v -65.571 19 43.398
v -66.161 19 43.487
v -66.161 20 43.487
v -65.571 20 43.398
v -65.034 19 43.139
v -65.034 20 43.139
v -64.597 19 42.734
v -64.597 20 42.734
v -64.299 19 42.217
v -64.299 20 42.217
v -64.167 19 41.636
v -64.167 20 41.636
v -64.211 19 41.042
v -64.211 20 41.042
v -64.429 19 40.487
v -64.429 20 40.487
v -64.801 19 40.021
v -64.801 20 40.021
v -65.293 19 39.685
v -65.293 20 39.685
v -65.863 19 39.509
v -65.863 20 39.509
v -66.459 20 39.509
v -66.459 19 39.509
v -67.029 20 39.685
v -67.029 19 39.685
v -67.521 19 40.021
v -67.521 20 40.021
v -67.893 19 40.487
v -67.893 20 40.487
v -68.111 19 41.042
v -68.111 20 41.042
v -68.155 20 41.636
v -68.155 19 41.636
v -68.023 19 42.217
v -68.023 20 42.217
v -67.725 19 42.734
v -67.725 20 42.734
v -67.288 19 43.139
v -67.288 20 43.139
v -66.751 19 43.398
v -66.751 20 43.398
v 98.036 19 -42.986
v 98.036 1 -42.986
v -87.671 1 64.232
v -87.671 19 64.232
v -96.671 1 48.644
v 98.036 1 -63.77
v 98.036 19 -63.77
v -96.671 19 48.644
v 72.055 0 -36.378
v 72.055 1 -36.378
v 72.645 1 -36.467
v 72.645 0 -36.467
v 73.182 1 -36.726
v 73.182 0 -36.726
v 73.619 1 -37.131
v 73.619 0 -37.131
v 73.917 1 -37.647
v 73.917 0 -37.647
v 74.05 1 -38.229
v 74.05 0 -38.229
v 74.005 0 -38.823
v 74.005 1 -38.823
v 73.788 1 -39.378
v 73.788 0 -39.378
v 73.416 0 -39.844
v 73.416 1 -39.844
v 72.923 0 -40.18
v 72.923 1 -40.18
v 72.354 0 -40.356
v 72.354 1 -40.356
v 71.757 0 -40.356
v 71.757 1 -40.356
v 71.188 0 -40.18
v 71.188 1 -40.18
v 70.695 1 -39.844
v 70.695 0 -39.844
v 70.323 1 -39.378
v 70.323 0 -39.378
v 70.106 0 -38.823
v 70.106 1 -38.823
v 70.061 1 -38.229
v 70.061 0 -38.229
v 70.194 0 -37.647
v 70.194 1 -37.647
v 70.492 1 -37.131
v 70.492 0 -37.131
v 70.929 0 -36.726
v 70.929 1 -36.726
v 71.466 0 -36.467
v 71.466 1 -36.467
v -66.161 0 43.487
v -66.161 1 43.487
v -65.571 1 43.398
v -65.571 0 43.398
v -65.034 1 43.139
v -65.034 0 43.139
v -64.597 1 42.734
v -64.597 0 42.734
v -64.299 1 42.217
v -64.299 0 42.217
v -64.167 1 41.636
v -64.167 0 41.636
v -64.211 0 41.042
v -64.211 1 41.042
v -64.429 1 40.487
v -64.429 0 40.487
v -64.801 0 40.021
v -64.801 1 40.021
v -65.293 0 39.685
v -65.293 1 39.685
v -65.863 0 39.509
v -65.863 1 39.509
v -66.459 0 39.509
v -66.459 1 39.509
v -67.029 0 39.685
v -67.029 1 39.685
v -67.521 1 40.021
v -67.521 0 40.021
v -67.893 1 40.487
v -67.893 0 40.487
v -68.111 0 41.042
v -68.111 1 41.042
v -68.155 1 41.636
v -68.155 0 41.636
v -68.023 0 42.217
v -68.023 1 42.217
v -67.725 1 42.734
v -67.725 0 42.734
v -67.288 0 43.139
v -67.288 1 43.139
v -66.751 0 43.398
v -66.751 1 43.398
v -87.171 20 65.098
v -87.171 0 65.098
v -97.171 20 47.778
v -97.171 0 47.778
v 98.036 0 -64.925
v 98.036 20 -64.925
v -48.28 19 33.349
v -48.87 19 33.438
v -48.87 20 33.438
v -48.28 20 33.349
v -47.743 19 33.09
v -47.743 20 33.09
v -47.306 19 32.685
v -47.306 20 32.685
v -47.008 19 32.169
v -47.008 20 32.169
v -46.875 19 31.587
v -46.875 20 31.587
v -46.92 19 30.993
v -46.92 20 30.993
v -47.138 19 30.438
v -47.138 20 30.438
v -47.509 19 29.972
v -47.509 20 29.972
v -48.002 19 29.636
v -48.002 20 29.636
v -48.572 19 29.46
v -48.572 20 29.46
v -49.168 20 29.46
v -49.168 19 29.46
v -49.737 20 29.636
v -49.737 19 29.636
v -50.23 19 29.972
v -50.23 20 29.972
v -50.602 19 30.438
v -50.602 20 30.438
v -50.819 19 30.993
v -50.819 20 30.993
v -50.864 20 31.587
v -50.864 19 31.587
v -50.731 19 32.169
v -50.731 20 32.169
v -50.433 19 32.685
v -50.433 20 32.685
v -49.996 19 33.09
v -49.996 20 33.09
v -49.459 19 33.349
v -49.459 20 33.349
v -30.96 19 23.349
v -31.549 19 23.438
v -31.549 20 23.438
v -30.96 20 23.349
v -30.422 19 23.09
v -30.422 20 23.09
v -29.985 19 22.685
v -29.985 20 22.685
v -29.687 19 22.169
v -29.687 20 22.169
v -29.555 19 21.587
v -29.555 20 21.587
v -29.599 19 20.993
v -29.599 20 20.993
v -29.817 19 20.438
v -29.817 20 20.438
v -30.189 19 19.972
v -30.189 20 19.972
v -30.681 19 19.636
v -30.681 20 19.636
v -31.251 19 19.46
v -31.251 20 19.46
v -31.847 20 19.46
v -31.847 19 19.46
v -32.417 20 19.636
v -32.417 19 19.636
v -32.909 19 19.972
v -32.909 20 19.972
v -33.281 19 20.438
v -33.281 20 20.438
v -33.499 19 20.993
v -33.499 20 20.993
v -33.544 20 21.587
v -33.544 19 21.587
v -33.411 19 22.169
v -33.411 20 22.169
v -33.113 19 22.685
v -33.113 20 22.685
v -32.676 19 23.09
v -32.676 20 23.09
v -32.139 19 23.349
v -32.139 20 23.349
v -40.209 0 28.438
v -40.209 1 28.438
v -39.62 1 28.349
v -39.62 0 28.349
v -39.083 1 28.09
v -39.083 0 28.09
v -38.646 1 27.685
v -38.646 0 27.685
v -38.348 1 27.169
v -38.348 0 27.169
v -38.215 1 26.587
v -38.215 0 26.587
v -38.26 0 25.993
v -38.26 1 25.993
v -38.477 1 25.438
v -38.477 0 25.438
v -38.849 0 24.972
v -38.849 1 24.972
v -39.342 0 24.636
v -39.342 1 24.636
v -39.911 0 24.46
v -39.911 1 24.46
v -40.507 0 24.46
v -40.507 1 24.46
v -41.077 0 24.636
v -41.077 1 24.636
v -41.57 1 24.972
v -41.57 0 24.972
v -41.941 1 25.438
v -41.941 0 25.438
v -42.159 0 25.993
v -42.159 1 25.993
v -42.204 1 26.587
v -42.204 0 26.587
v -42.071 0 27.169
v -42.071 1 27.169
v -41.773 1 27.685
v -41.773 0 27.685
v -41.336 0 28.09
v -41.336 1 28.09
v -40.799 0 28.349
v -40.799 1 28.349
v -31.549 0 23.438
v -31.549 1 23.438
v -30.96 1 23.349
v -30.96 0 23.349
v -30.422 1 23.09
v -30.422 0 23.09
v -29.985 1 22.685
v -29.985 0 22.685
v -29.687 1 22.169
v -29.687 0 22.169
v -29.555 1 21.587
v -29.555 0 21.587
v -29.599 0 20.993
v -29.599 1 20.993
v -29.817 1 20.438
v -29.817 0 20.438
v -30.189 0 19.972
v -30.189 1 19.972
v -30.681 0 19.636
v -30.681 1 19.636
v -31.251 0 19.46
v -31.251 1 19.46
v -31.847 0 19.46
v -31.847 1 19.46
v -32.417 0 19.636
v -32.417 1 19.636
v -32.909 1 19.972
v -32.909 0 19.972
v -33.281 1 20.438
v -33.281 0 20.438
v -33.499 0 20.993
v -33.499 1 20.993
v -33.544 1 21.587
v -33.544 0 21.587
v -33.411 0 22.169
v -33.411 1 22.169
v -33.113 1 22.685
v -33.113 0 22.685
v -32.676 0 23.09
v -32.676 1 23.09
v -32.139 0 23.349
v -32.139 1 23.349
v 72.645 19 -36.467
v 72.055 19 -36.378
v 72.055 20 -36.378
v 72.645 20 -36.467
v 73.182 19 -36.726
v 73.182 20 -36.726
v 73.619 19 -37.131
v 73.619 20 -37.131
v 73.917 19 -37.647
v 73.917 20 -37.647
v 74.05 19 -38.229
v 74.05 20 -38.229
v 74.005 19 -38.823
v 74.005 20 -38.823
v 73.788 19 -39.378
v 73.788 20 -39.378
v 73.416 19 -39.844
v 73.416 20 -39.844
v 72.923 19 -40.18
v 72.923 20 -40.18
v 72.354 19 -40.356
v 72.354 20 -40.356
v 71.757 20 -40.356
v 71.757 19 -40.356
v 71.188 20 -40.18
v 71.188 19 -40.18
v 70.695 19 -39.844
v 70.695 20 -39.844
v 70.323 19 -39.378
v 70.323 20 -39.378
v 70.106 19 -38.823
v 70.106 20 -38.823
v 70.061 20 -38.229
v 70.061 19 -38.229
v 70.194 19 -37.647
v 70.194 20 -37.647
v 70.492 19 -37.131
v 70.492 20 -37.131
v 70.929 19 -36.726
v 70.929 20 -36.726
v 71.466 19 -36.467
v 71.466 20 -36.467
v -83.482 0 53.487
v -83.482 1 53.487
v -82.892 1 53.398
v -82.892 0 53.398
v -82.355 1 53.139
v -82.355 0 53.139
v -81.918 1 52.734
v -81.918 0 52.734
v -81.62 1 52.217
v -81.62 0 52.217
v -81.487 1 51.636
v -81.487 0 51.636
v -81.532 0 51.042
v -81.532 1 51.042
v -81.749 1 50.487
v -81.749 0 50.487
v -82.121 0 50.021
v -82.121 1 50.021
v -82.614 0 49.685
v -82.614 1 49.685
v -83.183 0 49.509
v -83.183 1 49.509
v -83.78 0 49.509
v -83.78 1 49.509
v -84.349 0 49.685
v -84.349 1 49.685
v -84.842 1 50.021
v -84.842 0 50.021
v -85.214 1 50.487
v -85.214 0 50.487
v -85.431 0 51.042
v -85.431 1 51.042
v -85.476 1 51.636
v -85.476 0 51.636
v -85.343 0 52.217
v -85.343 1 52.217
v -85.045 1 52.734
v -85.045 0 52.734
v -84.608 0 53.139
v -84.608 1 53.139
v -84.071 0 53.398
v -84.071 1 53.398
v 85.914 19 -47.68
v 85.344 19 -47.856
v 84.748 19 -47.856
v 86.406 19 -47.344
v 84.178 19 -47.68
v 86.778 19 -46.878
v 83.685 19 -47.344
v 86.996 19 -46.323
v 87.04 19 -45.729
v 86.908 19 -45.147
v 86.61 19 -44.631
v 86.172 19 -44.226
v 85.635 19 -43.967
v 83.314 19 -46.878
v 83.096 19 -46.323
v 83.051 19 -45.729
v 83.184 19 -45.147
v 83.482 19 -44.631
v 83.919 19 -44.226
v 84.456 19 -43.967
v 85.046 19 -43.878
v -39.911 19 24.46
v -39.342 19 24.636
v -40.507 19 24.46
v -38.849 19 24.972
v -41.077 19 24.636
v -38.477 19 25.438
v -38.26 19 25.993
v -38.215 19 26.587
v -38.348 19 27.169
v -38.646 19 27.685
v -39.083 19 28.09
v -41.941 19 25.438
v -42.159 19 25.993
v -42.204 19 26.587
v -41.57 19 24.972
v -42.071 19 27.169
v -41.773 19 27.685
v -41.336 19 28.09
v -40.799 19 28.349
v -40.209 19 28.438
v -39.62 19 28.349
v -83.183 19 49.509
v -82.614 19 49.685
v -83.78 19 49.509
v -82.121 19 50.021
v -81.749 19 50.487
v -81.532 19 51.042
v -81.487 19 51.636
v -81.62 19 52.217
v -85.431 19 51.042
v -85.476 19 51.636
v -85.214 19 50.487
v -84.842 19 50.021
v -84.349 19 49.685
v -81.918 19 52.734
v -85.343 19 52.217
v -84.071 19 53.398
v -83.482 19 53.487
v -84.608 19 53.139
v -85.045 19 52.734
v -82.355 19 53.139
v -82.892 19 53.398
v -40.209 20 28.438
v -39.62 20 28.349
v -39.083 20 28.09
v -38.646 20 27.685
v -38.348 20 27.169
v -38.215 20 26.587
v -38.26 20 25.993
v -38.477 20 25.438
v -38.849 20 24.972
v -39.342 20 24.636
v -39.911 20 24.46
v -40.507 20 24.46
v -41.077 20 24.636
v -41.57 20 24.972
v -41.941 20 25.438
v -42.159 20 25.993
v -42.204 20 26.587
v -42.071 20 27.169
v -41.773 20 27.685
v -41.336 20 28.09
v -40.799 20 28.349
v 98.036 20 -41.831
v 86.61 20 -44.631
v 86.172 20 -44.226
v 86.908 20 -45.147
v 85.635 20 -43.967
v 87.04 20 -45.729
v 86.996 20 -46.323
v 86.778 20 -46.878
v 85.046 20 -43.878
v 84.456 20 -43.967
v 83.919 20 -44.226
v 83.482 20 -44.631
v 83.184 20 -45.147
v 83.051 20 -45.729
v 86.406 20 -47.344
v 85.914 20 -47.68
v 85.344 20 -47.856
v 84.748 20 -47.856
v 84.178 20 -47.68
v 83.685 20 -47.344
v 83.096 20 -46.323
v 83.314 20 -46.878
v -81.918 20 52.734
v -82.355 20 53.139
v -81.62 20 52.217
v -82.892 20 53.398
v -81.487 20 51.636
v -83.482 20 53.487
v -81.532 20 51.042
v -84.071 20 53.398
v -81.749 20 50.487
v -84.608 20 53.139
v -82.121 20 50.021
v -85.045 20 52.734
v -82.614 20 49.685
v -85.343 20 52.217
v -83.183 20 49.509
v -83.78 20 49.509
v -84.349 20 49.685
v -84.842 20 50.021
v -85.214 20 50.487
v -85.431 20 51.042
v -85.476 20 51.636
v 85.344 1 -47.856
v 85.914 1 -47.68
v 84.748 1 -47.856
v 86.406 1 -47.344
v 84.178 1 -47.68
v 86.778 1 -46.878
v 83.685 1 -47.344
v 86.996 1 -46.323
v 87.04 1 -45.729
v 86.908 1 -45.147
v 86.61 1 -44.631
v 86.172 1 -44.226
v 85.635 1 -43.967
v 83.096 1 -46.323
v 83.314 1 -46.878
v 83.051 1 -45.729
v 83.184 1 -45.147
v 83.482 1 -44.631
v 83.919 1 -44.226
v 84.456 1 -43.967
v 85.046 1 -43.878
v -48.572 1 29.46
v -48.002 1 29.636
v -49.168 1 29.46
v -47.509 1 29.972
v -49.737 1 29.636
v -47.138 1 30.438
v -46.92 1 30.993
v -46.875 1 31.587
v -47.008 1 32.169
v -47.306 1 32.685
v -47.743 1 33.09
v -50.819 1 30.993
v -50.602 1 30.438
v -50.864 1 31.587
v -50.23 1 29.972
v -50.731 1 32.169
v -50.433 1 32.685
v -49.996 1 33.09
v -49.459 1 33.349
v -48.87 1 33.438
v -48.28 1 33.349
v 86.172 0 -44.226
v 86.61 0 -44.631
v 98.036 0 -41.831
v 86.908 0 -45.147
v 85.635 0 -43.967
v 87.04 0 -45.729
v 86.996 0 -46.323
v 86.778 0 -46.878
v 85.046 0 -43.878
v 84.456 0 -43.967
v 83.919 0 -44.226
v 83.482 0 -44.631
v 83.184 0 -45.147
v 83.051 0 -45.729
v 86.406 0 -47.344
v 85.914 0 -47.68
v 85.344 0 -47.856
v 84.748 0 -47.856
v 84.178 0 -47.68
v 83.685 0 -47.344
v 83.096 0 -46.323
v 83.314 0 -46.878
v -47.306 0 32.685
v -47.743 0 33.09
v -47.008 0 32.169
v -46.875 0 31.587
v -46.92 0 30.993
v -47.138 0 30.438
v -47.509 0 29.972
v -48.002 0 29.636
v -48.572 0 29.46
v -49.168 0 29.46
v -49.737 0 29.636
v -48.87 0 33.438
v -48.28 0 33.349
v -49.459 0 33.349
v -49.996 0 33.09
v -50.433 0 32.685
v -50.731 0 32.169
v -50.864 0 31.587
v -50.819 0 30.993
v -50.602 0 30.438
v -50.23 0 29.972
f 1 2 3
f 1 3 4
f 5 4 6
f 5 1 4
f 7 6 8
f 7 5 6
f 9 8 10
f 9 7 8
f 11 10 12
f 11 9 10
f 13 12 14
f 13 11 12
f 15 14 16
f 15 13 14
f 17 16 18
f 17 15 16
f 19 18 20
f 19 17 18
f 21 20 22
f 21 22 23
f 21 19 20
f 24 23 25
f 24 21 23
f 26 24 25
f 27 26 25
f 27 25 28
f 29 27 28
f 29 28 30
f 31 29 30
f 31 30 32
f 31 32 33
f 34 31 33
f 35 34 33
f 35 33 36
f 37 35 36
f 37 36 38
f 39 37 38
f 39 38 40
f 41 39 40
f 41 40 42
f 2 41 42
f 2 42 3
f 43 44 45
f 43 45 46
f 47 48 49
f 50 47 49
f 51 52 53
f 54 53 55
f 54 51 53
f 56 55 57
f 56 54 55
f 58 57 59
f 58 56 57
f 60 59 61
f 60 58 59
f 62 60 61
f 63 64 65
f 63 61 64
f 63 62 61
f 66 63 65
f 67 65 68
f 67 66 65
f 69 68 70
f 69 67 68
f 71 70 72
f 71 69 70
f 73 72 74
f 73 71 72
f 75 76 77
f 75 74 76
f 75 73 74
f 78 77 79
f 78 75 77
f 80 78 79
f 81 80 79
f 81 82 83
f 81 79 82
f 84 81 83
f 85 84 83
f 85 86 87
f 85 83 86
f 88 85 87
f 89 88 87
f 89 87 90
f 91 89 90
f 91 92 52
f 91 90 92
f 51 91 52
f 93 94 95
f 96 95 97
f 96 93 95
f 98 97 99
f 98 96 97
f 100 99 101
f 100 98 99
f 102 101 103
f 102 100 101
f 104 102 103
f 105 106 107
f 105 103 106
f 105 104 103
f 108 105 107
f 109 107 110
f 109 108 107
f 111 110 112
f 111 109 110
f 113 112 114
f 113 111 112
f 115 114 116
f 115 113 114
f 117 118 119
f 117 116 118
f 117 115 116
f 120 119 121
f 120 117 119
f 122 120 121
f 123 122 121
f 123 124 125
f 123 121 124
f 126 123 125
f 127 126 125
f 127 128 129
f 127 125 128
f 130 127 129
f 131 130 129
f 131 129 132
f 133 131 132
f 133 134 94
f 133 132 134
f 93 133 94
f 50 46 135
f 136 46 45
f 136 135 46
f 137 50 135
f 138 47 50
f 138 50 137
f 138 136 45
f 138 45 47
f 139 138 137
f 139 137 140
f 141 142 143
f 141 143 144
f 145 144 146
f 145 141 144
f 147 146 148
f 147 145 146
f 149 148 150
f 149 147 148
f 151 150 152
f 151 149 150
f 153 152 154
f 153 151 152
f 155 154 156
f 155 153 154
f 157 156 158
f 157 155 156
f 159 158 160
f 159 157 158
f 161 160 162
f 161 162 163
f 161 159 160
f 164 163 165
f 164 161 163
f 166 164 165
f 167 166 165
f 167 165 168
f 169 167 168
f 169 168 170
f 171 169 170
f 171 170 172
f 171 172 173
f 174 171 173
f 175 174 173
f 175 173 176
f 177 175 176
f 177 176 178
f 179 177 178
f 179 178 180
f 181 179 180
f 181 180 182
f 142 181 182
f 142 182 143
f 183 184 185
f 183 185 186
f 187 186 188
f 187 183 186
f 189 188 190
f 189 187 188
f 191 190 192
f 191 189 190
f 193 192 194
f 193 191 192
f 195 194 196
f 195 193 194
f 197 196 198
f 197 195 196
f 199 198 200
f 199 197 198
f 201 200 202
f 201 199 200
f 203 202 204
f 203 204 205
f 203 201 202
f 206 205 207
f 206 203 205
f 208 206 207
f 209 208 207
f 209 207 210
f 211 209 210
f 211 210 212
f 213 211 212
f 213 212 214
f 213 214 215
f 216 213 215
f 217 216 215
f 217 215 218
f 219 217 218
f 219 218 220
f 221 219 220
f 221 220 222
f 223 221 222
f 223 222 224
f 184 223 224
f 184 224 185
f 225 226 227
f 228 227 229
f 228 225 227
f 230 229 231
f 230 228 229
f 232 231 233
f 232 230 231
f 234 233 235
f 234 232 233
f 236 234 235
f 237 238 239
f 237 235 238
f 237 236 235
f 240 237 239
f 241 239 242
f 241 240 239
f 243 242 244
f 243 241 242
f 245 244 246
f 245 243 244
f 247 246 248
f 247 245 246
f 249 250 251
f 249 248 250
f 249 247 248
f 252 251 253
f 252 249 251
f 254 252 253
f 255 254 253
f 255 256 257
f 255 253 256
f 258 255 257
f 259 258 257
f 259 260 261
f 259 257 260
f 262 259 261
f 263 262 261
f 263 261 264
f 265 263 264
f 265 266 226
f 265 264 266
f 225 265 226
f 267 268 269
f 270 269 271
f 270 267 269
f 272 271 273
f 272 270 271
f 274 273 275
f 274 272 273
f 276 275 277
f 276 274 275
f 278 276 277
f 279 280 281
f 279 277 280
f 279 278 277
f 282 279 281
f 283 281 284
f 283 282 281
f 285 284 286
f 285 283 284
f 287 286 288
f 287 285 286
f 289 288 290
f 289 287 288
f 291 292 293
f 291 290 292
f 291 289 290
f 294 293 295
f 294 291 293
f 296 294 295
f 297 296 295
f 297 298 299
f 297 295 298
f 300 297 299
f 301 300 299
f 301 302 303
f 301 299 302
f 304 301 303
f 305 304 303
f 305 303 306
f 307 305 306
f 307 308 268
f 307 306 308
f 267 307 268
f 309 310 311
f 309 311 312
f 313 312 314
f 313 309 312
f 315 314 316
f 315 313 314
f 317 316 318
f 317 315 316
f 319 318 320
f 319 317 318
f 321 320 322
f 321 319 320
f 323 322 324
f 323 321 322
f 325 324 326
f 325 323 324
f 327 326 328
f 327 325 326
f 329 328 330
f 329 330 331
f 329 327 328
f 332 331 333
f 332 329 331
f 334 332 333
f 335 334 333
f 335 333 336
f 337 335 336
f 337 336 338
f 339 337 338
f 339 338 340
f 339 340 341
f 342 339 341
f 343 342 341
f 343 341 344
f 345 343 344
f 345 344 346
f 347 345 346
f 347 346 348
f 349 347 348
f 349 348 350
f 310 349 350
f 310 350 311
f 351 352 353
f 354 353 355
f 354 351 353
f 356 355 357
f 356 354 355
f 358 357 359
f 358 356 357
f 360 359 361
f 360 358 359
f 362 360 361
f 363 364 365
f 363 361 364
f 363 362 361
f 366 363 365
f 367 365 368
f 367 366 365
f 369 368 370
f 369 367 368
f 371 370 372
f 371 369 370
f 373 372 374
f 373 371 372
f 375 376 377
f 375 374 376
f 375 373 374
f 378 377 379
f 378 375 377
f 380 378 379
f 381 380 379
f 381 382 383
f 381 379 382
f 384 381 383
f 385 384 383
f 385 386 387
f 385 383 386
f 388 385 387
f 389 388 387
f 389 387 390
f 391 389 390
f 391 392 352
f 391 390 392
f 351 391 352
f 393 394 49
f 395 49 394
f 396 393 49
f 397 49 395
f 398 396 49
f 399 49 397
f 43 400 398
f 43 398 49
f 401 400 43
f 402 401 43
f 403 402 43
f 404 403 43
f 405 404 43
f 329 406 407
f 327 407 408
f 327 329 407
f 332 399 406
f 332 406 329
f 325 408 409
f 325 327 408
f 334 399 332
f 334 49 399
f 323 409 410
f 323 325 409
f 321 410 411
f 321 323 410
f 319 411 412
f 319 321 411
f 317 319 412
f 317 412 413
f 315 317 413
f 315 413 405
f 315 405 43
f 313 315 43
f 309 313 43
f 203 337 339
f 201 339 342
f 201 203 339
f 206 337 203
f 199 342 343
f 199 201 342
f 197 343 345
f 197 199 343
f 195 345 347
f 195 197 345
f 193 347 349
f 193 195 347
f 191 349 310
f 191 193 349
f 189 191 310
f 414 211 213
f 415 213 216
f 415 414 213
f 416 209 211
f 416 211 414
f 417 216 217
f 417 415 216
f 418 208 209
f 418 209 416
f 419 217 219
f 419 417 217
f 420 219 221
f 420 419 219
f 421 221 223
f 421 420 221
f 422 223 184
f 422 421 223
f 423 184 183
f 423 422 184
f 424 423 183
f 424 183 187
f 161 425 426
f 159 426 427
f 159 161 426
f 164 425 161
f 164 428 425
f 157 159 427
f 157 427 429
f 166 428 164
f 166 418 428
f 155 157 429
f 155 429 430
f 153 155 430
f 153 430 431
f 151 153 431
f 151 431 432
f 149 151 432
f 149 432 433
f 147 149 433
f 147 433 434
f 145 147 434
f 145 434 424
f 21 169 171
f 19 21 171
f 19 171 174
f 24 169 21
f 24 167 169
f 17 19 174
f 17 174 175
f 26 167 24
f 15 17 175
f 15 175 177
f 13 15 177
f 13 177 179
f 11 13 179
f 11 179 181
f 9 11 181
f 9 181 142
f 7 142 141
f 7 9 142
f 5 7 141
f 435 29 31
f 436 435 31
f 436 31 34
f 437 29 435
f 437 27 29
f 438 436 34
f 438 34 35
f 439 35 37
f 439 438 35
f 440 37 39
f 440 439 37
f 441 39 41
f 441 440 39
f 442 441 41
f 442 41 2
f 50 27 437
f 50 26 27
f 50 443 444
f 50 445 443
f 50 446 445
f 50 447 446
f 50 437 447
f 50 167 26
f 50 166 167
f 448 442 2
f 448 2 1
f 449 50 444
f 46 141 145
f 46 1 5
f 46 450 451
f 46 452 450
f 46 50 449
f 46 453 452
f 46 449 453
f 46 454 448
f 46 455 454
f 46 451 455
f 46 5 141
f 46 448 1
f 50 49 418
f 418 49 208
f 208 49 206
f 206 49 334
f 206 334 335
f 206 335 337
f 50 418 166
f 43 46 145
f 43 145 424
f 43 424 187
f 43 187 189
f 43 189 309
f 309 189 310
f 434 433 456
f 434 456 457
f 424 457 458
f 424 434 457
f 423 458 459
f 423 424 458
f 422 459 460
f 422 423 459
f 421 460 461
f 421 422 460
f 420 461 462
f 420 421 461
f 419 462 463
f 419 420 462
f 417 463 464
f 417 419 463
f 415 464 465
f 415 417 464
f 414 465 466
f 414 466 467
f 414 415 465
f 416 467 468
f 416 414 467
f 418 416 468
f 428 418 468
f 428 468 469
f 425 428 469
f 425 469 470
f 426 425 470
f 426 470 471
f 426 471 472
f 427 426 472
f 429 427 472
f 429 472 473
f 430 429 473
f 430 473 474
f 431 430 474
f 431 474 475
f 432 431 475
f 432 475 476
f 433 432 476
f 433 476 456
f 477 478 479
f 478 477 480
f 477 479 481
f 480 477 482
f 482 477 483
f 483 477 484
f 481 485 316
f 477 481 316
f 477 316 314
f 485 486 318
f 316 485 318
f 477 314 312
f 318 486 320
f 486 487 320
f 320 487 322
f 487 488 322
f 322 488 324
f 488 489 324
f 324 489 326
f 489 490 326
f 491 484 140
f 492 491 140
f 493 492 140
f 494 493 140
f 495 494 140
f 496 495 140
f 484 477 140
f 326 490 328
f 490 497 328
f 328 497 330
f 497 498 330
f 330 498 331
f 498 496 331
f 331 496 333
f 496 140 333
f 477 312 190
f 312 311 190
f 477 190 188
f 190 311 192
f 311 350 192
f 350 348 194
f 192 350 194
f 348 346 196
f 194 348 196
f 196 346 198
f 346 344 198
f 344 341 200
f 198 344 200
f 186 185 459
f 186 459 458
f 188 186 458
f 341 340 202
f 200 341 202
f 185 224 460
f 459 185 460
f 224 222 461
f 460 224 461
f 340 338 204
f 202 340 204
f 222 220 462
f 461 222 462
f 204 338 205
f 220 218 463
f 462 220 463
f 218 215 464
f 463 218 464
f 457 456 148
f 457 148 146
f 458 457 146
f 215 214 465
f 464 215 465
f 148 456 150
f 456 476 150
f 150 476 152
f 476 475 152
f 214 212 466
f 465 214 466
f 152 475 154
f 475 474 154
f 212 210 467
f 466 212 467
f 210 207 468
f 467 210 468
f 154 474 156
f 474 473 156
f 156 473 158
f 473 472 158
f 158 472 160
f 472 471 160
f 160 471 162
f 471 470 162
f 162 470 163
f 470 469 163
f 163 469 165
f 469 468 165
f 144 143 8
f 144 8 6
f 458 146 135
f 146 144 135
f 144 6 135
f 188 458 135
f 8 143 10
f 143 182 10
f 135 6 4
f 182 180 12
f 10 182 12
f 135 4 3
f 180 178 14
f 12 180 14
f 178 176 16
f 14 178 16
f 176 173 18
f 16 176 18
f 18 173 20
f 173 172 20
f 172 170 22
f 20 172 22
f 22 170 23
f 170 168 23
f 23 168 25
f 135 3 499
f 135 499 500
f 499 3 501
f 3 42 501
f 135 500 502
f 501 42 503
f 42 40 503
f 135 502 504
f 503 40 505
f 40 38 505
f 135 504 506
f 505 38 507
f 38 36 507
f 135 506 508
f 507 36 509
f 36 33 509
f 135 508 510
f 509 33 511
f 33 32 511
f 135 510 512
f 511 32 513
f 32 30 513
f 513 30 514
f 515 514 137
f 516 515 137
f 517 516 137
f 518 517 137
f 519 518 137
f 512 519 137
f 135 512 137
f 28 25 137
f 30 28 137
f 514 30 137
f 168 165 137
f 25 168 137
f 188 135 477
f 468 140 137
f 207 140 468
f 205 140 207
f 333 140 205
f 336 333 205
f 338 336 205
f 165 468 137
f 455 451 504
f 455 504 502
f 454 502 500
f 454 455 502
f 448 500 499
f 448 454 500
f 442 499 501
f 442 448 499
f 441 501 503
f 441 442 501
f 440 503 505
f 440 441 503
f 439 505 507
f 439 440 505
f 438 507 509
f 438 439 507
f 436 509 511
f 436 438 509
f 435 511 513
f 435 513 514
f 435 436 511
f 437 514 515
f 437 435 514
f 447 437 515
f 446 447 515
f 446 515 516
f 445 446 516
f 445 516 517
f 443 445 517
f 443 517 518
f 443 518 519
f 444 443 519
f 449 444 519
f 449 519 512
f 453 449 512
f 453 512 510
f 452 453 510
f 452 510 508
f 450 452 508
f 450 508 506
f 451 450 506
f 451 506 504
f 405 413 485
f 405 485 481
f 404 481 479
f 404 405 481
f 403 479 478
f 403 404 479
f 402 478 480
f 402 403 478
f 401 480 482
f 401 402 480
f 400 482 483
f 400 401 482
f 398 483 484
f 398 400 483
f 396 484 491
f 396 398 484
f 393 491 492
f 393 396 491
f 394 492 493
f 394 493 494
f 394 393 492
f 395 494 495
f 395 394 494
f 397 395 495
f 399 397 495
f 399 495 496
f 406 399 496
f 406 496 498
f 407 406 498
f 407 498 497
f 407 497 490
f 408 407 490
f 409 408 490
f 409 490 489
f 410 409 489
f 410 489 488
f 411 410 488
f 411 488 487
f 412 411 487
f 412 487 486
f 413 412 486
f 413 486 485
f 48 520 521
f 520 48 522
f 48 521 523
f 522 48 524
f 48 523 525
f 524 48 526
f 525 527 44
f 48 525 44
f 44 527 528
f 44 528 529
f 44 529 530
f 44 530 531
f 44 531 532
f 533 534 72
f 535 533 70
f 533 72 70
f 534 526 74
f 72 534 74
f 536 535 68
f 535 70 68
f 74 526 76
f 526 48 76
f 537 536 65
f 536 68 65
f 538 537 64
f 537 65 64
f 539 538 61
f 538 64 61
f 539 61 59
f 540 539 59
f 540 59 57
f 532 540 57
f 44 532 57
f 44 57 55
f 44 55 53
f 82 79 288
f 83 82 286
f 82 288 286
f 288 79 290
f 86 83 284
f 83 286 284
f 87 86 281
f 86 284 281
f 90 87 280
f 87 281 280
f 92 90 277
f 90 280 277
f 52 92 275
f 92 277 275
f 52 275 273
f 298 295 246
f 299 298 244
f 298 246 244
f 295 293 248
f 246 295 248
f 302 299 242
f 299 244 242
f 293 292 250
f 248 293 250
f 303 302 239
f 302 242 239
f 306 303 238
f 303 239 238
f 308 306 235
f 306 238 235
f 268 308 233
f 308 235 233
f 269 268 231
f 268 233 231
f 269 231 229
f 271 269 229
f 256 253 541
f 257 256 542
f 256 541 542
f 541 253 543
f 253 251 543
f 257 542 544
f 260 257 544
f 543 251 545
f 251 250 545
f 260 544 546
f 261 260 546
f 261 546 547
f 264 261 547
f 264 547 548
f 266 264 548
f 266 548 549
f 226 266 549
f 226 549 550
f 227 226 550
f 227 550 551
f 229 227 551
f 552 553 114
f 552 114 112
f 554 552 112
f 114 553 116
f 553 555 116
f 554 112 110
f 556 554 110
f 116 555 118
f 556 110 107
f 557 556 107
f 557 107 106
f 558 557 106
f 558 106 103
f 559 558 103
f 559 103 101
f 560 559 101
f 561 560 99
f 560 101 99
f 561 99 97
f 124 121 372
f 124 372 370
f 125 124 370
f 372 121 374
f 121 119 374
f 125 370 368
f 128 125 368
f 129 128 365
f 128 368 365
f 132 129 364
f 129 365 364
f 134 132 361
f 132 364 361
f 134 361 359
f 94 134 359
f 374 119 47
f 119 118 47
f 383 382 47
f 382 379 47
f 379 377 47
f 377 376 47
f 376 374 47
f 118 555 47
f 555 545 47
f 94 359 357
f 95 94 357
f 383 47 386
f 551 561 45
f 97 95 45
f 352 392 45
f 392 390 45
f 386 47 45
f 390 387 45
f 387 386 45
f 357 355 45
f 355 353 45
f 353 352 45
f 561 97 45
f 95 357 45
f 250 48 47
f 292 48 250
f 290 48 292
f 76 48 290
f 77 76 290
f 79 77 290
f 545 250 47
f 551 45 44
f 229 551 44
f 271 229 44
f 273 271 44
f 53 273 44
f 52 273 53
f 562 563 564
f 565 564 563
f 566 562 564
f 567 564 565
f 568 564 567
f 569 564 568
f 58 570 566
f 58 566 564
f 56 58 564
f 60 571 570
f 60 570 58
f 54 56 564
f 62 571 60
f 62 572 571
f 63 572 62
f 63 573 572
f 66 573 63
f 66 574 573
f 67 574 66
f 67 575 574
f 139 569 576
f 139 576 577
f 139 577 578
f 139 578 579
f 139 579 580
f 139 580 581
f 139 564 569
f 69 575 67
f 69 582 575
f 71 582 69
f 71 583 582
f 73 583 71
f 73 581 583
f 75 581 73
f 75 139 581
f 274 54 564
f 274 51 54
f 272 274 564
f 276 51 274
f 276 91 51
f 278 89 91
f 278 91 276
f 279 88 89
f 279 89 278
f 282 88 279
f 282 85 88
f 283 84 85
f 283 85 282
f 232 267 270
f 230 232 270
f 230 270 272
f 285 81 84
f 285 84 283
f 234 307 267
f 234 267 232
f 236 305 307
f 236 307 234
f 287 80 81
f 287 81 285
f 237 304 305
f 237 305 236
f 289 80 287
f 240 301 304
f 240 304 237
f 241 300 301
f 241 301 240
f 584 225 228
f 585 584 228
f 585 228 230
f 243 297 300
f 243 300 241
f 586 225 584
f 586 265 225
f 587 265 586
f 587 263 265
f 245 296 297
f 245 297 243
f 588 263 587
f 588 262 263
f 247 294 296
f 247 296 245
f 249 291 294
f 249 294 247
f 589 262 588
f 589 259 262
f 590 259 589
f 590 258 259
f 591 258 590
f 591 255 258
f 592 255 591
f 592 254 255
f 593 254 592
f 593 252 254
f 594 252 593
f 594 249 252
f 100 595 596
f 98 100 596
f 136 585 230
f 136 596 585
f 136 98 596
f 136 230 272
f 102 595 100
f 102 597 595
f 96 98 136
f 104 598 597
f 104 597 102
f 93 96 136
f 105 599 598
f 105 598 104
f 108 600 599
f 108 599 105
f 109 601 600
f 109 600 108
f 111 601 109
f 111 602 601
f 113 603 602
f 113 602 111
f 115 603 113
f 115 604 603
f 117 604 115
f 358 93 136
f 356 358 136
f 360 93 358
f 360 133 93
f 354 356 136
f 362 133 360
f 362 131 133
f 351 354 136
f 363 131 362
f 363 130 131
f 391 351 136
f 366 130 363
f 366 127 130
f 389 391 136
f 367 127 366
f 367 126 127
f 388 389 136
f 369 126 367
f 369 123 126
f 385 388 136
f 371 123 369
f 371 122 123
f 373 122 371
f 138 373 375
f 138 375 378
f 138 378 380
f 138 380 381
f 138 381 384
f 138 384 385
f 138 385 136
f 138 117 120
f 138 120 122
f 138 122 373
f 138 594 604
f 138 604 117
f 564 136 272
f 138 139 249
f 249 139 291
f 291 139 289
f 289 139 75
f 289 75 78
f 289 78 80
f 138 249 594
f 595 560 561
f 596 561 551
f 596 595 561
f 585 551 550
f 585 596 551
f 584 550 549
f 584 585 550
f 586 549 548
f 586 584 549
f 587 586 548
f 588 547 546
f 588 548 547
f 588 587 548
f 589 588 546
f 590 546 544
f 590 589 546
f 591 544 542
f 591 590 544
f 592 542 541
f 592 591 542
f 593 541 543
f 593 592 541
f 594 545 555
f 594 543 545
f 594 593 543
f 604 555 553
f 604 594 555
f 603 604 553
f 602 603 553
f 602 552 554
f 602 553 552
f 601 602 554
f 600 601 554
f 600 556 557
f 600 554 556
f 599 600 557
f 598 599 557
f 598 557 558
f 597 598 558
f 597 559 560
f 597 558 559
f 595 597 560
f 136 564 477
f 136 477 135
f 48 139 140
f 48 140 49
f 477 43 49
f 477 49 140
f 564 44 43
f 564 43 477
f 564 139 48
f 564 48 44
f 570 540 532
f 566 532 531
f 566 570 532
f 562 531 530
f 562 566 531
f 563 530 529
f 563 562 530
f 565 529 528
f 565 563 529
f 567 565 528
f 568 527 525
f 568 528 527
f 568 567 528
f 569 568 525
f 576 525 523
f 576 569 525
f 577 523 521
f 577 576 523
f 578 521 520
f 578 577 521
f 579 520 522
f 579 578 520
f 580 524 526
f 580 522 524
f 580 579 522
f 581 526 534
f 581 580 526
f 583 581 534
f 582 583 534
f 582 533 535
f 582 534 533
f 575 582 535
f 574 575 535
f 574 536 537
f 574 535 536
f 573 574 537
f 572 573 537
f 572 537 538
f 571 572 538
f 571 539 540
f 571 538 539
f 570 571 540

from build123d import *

# Parameters (mm, degrees)
SKETCH_1_R          = 2
EXTRUDE_1_DEPTH     = 20
SKETCH_2_W          = 18
SKETCH_2_H          = 18
CUT_EXTRUDE_1_DEPTH = 227.406099505


with BuildPart() as part:
    # 草图1 → 凸台-拉伸1 (new body)
    with BuildSketch(Plane(origin=(0, 0, 0), x_dir=(1, 0, 0), z_dir=(0, 1, 0))):
        Polygon((98.036220612, 64.925160964), (98.036220612, 41.831150196), (-87.17089272, -65.098226542), (-97.17089272, -47.777718466), align=None)
        with Locations(Location((-83.481517274, -51.486680212, 0), (0, 0, 270))):
            Circle(SKETCH_1_R, mode=Mode.SUBTRACT)
        with Locations(Location((-66.161009198, -41.486680212, 0), (0, 0, 270))):
            Circle(SKETCH_1_R, mode=Mode.SUBTRACT)
        with Locations(Location((-48.86962253, -31.437972504, 0), (0, 0, 270))):
            Circle(SKETCH_1_R, mode=Mode.SUBTRACT)
        with Locations(Location((-40.209368493, -26.437972504, 0), (0, 0, 270))):
            Circle(SKETCH_1_R, mode=Mode.SUBTRACT)
        with Locations(Location((-31.549114455, -21.437972504, 0), (0, 0, 270))):
            Circle(SKETCH_1_R, mode=Mode.SUBTRACT)
        with Locations(Location((72.055458499, 38.37815558, 0), (0, 0, 270))):
            Circle(SKETCH_1_R, mode=Mode.SUBTRACT)
        with Locations(Location((85.045839556, 45.87815558, 0), (0, 0, 270))):
            Circle(SKETCH_1_R, mode=Mode.SUBTRACT)
    extrude(amount=EXTRUDE_1_DEPTH)

    # 草图2 → 切除-拉伸1 (cut, through all)
    with BuildSketch(Plane(origin=(-93.566528503, 0, 54.020660418), x_dir=(0.500000000000001, 0, 0.8660254037844382), z_dir=(-0.866025403784438, 0, 0.5000000000000009))):
        with Locations((2.791271567, 10)):
            Rectangle(SKETCH_2_W, SKETCH_2_H)
    extrude(amount=-CUT_EXTRUDE_1_DEPTH, mode=Mode.SUBTRACT)


solid = part.part
